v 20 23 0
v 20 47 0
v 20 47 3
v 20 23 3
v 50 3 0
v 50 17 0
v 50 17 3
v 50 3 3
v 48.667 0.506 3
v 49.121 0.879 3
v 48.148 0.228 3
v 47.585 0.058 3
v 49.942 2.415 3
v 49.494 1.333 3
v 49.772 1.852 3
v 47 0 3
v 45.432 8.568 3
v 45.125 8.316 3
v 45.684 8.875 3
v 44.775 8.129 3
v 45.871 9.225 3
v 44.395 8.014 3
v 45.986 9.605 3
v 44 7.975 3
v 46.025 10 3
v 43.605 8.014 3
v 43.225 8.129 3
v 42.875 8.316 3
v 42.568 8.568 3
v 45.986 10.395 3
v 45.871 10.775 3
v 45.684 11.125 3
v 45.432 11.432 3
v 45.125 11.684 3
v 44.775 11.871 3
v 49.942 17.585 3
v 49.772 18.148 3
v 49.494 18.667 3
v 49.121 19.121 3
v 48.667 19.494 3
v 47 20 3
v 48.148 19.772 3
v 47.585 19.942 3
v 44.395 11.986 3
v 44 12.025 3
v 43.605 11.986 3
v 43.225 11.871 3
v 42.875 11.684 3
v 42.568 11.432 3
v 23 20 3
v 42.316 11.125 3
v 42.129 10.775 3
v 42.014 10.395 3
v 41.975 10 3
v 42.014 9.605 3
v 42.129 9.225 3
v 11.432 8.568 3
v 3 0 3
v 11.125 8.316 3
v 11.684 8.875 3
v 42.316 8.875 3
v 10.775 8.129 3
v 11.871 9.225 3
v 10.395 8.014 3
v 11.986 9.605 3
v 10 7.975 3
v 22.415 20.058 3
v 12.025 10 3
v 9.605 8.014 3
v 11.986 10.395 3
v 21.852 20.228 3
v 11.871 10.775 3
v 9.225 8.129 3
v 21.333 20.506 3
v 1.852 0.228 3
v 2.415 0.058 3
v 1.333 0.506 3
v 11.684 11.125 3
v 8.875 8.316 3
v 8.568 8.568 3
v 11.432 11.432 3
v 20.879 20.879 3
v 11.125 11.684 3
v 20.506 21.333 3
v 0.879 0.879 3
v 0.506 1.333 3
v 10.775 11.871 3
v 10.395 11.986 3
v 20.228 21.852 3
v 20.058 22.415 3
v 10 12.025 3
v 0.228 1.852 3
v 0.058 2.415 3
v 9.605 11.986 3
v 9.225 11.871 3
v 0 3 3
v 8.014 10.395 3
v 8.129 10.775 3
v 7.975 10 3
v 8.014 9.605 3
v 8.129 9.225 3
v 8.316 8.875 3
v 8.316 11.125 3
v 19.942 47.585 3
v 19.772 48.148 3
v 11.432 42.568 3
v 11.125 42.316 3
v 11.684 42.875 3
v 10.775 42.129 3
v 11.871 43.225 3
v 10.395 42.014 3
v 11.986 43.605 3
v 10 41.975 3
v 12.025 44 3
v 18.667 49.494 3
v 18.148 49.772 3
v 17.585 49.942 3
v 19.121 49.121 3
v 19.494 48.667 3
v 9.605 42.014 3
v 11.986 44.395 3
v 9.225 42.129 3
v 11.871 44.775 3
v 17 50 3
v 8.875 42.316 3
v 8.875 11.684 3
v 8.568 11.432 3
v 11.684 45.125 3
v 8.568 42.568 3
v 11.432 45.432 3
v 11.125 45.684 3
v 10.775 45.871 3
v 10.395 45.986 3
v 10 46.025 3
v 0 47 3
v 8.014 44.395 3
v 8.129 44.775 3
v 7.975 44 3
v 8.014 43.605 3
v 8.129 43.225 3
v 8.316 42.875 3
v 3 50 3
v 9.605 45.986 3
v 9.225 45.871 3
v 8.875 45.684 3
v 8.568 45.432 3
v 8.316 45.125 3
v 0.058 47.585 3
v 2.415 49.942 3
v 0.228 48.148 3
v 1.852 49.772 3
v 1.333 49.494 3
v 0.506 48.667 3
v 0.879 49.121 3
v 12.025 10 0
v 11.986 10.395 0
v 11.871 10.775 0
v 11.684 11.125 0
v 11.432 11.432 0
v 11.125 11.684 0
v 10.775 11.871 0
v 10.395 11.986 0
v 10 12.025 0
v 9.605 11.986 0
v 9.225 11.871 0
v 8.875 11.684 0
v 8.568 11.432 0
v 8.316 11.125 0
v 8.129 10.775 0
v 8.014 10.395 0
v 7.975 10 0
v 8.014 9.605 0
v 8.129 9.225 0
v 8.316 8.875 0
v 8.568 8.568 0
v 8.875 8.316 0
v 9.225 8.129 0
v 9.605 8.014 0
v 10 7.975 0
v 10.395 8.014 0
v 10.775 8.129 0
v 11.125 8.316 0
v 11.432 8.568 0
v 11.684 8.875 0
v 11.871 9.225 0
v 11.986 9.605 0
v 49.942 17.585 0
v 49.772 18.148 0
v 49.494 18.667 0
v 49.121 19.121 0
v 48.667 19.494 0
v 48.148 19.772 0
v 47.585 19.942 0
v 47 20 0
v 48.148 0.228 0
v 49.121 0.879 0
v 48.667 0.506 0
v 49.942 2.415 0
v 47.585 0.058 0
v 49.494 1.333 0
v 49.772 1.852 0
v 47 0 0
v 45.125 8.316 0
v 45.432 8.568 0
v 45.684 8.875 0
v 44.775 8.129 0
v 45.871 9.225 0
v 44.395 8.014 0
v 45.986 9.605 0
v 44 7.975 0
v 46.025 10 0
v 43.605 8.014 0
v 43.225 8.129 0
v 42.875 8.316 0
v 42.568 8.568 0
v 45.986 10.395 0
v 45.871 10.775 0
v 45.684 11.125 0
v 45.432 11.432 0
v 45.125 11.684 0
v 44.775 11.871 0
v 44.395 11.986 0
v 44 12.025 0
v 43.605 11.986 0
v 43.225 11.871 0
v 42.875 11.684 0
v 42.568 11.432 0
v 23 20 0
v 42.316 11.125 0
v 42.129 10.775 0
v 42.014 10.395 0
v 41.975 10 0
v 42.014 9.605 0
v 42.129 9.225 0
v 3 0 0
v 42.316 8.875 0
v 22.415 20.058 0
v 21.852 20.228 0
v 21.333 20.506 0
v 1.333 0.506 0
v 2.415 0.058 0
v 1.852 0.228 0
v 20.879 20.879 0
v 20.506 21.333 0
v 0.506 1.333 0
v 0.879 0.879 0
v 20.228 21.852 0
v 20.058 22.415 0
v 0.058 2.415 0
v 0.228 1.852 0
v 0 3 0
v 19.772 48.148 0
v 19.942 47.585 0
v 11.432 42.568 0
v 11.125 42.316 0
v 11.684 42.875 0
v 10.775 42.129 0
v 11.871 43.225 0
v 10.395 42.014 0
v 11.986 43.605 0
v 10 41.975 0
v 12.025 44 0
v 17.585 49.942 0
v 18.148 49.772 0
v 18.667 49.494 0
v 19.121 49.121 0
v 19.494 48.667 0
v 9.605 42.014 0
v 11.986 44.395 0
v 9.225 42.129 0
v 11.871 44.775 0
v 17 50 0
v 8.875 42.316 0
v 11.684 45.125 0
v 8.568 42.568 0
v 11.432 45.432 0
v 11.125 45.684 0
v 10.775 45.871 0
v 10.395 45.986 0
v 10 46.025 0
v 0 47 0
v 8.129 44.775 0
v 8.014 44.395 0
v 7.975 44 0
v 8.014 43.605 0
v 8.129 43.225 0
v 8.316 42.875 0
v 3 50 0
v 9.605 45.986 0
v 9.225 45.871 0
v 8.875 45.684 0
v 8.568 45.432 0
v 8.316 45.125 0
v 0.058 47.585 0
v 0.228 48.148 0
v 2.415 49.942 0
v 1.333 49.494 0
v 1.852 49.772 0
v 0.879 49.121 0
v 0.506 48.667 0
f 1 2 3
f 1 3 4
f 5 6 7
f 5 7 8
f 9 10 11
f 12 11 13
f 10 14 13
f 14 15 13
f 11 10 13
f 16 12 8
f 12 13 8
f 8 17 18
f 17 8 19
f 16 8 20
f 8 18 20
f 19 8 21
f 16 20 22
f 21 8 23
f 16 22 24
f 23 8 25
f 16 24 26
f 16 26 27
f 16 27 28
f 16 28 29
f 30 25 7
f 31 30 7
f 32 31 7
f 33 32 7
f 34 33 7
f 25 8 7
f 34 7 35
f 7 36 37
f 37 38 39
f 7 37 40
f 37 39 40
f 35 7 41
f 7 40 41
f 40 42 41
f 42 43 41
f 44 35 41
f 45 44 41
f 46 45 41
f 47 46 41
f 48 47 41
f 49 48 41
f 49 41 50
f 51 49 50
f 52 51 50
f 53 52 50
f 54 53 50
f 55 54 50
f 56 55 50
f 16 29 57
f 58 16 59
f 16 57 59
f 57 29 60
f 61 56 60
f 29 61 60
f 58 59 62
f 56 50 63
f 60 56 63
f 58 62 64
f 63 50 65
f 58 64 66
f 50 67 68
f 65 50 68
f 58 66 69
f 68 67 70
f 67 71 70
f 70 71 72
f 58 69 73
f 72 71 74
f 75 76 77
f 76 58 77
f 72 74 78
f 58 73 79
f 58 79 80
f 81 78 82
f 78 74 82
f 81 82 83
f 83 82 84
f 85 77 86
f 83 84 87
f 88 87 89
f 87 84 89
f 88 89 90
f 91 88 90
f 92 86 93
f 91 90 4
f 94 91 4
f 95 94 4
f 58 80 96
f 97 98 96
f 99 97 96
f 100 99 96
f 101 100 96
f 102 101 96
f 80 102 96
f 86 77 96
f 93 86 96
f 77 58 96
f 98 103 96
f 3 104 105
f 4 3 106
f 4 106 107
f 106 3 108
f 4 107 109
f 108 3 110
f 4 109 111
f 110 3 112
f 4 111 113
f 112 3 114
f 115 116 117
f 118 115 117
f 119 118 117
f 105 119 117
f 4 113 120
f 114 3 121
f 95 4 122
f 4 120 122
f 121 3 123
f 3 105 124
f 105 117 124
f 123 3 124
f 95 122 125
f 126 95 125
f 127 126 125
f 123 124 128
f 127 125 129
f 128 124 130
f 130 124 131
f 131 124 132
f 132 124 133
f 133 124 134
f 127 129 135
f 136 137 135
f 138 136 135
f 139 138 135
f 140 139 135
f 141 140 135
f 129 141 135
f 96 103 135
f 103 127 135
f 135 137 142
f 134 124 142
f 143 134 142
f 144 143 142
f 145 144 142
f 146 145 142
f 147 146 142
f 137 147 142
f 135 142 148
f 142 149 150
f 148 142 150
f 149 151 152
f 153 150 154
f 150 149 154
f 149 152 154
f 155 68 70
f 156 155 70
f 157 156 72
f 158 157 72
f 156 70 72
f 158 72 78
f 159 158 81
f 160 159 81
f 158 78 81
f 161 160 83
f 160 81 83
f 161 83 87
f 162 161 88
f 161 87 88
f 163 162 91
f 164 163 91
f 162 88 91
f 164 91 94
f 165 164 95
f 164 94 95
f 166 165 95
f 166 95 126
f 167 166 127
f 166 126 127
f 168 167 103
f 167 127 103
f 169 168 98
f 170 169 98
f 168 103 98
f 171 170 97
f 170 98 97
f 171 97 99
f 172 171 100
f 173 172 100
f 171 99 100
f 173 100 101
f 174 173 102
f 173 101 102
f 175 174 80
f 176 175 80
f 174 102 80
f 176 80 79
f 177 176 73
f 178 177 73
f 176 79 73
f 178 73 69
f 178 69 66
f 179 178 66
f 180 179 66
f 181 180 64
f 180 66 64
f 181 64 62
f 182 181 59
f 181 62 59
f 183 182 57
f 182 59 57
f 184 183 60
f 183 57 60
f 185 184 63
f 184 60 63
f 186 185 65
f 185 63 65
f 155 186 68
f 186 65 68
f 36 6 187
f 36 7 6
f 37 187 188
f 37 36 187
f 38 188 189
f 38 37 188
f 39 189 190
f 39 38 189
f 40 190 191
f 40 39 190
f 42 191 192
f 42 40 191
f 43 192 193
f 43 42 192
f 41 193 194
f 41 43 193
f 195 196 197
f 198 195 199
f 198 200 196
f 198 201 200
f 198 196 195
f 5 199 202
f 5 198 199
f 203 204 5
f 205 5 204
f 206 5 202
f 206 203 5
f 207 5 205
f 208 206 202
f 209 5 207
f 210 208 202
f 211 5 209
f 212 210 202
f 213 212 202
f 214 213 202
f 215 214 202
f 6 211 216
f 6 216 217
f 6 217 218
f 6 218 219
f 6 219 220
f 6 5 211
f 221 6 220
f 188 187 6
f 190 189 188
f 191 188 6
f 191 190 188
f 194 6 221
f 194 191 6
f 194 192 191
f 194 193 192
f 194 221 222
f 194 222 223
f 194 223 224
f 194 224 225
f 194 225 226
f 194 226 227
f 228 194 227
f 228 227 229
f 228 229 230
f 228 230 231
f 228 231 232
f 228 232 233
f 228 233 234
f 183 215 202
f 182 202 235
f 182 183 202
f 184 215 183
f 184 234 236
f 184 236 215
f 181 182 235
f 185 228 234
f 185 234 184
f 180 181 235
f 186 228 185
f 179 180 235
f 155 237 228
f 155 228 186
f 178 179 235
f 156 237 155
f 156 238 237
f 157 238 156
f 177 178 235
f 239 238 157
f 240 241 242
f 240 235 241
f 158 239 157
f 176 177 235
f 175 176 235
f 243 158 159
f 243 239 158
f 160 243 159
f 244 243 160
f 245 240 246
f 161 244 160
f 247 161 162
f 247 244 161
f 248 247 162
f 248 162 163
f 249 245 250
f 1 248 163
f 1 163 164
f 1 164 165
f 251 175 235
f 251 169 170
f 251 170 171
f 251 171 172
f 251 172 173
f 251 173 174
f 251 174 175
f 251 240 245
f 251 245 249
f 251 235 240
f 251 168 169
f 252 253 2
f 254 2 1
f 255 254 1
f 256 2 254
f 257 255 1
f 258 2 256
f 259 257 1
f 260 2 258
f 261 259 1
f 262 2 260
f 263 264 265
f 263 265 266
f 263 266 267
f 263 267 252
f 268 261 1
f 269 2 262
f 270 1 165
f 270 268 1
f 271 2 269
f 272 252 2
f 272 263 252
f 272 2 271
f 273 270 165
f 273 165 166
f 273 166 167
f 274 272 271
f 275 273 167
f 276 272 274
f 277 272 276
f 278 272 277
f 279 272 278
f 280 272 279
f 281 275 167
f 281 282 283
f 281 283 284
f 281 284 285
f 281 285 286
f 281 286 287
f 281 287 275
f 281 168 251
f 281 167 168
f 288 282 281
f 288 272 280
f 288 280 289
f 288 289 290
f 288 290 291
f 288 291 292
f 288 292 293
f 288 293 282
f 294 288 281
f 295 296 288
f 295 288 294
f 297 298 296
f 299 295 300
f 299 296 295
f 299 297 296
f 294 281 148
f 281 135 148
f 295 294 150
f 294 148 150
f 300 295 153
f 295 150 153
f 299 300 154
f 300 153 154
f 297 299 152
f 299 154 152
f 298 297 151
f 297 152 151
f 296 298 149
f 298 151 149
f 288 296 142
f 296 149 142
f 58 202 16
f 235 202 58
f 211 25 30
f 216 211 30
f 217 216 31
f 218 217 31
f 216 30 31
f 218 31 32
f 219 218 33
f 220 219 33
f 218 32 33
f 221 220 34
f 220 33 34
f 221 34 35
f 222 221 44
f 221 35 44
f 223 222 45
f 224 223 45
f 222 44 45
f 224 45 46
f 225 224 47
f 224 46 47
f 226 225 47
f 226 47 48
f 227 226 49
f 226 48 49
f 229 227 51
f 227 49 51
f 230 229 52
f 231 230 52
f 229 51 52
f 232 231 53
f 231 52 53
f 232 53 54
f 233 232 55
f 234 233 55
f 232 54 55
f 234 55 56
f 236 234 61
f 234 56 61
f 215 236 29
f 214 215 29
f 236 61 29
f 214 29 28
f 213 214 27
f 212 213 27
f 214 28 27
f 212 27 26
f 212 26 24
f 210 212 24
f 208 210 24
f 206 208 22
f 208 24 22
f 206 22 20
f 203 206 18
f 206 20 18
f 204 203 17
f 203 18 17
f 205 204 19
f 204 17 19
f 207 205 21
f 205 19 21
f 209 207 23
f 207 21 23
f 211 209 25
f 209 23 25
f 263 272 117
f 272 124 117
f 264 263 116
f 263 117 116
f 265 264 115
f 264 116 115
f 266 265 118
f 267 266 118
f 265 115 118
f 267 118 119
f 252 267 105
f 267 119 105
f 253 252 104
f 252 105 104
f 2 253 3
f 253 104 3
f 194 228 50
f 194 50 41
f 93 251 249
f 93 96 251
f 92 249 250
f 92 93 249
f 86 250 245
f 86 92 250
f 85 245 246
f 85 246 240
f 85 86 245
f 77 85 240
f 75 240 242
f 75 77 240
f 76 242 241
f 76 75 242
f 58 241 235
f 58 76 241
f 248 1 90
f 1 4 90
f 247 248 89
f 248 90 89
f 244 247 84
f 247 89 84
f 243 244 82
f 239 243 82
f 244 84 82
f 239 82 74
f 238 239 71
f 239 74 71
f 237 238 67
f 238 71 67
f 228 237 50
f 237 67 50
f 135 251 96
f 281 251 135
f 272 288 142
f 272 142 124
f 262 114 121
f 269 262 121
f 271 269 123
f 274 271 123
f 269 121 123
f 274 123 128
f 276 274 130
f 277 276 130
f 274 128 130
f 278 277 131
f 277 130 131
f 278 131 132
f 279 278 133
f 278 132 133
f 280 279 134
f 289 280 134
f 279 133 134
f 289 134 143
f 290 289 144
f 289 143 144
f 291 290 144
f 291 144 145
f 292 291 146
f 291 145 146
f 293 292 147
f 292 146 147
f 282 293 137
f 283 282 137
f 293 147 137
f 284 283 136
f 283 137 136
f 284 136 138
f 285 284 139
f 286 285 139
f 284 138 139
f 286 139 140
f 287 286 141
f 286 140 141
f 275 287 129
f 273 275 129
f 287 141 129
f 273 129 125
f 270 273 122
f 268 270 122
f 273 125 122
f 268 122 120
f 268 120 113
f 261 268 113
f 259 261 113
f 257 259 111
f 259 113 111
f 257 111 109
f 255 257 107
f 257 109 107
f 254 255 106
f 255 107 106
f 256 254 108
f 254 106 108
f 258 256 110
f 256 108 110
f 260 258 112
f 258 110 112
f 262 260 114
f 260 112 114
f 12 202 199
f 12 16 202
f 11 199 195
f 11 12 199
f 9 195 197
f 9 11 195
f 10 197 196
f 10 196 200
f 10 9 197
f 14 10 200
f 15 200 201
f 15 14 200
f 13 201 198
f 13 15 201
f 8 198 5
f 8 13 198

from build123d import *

# Parameters (mm, degrees)
EXTRUDE_1_DEPTH     = 3
SKETCH_2_R          = 2.025
CUT_EXTRUDE_1_DEPTH = 3
FILLET_1_R          = 3


with BuildPart() as part:
    # 草图1 → 凸台-拉伸1 (new body)
    with BuildSketch(Plane.XY):
        Polygon((0, 0), (0, 50), (20, 50), (20, 20), (50, 20), (50, 0), align=None)
    extrude(amount=EXTRUDE_1_DEPTH)

    # 草图2 → 切除-拉伸1 (cut)
    with BuildSketch(Plane.XY.offset(3)):
        with Locations((10, 10)):
            Circle(SKETCH_2_R)
        with Locations((10, 44)):
            Circle(SKETCH_2_R)
        with Locations((44, 10)):
            Circle(SKETCH_2_R)
    extrude(amount=-CUT_EXTRUDE_1_DEPTH, mode=Mode.SUBTRACT)

    # 圆角1
    fillet_1_edges = [part.edges().sort_by_distance(p)[0] for p in [
        (0, 0, 1.5),
        (0, 50, 1.5),
        (20, 50, 1.5),
        (20, 20, 1.5),
        (50, 20, 1.5),
        (50, 0, 1.5),
    ]]
    fillet(fillet_1_edges, radius=FILLET_1_R)


solid = part.part
